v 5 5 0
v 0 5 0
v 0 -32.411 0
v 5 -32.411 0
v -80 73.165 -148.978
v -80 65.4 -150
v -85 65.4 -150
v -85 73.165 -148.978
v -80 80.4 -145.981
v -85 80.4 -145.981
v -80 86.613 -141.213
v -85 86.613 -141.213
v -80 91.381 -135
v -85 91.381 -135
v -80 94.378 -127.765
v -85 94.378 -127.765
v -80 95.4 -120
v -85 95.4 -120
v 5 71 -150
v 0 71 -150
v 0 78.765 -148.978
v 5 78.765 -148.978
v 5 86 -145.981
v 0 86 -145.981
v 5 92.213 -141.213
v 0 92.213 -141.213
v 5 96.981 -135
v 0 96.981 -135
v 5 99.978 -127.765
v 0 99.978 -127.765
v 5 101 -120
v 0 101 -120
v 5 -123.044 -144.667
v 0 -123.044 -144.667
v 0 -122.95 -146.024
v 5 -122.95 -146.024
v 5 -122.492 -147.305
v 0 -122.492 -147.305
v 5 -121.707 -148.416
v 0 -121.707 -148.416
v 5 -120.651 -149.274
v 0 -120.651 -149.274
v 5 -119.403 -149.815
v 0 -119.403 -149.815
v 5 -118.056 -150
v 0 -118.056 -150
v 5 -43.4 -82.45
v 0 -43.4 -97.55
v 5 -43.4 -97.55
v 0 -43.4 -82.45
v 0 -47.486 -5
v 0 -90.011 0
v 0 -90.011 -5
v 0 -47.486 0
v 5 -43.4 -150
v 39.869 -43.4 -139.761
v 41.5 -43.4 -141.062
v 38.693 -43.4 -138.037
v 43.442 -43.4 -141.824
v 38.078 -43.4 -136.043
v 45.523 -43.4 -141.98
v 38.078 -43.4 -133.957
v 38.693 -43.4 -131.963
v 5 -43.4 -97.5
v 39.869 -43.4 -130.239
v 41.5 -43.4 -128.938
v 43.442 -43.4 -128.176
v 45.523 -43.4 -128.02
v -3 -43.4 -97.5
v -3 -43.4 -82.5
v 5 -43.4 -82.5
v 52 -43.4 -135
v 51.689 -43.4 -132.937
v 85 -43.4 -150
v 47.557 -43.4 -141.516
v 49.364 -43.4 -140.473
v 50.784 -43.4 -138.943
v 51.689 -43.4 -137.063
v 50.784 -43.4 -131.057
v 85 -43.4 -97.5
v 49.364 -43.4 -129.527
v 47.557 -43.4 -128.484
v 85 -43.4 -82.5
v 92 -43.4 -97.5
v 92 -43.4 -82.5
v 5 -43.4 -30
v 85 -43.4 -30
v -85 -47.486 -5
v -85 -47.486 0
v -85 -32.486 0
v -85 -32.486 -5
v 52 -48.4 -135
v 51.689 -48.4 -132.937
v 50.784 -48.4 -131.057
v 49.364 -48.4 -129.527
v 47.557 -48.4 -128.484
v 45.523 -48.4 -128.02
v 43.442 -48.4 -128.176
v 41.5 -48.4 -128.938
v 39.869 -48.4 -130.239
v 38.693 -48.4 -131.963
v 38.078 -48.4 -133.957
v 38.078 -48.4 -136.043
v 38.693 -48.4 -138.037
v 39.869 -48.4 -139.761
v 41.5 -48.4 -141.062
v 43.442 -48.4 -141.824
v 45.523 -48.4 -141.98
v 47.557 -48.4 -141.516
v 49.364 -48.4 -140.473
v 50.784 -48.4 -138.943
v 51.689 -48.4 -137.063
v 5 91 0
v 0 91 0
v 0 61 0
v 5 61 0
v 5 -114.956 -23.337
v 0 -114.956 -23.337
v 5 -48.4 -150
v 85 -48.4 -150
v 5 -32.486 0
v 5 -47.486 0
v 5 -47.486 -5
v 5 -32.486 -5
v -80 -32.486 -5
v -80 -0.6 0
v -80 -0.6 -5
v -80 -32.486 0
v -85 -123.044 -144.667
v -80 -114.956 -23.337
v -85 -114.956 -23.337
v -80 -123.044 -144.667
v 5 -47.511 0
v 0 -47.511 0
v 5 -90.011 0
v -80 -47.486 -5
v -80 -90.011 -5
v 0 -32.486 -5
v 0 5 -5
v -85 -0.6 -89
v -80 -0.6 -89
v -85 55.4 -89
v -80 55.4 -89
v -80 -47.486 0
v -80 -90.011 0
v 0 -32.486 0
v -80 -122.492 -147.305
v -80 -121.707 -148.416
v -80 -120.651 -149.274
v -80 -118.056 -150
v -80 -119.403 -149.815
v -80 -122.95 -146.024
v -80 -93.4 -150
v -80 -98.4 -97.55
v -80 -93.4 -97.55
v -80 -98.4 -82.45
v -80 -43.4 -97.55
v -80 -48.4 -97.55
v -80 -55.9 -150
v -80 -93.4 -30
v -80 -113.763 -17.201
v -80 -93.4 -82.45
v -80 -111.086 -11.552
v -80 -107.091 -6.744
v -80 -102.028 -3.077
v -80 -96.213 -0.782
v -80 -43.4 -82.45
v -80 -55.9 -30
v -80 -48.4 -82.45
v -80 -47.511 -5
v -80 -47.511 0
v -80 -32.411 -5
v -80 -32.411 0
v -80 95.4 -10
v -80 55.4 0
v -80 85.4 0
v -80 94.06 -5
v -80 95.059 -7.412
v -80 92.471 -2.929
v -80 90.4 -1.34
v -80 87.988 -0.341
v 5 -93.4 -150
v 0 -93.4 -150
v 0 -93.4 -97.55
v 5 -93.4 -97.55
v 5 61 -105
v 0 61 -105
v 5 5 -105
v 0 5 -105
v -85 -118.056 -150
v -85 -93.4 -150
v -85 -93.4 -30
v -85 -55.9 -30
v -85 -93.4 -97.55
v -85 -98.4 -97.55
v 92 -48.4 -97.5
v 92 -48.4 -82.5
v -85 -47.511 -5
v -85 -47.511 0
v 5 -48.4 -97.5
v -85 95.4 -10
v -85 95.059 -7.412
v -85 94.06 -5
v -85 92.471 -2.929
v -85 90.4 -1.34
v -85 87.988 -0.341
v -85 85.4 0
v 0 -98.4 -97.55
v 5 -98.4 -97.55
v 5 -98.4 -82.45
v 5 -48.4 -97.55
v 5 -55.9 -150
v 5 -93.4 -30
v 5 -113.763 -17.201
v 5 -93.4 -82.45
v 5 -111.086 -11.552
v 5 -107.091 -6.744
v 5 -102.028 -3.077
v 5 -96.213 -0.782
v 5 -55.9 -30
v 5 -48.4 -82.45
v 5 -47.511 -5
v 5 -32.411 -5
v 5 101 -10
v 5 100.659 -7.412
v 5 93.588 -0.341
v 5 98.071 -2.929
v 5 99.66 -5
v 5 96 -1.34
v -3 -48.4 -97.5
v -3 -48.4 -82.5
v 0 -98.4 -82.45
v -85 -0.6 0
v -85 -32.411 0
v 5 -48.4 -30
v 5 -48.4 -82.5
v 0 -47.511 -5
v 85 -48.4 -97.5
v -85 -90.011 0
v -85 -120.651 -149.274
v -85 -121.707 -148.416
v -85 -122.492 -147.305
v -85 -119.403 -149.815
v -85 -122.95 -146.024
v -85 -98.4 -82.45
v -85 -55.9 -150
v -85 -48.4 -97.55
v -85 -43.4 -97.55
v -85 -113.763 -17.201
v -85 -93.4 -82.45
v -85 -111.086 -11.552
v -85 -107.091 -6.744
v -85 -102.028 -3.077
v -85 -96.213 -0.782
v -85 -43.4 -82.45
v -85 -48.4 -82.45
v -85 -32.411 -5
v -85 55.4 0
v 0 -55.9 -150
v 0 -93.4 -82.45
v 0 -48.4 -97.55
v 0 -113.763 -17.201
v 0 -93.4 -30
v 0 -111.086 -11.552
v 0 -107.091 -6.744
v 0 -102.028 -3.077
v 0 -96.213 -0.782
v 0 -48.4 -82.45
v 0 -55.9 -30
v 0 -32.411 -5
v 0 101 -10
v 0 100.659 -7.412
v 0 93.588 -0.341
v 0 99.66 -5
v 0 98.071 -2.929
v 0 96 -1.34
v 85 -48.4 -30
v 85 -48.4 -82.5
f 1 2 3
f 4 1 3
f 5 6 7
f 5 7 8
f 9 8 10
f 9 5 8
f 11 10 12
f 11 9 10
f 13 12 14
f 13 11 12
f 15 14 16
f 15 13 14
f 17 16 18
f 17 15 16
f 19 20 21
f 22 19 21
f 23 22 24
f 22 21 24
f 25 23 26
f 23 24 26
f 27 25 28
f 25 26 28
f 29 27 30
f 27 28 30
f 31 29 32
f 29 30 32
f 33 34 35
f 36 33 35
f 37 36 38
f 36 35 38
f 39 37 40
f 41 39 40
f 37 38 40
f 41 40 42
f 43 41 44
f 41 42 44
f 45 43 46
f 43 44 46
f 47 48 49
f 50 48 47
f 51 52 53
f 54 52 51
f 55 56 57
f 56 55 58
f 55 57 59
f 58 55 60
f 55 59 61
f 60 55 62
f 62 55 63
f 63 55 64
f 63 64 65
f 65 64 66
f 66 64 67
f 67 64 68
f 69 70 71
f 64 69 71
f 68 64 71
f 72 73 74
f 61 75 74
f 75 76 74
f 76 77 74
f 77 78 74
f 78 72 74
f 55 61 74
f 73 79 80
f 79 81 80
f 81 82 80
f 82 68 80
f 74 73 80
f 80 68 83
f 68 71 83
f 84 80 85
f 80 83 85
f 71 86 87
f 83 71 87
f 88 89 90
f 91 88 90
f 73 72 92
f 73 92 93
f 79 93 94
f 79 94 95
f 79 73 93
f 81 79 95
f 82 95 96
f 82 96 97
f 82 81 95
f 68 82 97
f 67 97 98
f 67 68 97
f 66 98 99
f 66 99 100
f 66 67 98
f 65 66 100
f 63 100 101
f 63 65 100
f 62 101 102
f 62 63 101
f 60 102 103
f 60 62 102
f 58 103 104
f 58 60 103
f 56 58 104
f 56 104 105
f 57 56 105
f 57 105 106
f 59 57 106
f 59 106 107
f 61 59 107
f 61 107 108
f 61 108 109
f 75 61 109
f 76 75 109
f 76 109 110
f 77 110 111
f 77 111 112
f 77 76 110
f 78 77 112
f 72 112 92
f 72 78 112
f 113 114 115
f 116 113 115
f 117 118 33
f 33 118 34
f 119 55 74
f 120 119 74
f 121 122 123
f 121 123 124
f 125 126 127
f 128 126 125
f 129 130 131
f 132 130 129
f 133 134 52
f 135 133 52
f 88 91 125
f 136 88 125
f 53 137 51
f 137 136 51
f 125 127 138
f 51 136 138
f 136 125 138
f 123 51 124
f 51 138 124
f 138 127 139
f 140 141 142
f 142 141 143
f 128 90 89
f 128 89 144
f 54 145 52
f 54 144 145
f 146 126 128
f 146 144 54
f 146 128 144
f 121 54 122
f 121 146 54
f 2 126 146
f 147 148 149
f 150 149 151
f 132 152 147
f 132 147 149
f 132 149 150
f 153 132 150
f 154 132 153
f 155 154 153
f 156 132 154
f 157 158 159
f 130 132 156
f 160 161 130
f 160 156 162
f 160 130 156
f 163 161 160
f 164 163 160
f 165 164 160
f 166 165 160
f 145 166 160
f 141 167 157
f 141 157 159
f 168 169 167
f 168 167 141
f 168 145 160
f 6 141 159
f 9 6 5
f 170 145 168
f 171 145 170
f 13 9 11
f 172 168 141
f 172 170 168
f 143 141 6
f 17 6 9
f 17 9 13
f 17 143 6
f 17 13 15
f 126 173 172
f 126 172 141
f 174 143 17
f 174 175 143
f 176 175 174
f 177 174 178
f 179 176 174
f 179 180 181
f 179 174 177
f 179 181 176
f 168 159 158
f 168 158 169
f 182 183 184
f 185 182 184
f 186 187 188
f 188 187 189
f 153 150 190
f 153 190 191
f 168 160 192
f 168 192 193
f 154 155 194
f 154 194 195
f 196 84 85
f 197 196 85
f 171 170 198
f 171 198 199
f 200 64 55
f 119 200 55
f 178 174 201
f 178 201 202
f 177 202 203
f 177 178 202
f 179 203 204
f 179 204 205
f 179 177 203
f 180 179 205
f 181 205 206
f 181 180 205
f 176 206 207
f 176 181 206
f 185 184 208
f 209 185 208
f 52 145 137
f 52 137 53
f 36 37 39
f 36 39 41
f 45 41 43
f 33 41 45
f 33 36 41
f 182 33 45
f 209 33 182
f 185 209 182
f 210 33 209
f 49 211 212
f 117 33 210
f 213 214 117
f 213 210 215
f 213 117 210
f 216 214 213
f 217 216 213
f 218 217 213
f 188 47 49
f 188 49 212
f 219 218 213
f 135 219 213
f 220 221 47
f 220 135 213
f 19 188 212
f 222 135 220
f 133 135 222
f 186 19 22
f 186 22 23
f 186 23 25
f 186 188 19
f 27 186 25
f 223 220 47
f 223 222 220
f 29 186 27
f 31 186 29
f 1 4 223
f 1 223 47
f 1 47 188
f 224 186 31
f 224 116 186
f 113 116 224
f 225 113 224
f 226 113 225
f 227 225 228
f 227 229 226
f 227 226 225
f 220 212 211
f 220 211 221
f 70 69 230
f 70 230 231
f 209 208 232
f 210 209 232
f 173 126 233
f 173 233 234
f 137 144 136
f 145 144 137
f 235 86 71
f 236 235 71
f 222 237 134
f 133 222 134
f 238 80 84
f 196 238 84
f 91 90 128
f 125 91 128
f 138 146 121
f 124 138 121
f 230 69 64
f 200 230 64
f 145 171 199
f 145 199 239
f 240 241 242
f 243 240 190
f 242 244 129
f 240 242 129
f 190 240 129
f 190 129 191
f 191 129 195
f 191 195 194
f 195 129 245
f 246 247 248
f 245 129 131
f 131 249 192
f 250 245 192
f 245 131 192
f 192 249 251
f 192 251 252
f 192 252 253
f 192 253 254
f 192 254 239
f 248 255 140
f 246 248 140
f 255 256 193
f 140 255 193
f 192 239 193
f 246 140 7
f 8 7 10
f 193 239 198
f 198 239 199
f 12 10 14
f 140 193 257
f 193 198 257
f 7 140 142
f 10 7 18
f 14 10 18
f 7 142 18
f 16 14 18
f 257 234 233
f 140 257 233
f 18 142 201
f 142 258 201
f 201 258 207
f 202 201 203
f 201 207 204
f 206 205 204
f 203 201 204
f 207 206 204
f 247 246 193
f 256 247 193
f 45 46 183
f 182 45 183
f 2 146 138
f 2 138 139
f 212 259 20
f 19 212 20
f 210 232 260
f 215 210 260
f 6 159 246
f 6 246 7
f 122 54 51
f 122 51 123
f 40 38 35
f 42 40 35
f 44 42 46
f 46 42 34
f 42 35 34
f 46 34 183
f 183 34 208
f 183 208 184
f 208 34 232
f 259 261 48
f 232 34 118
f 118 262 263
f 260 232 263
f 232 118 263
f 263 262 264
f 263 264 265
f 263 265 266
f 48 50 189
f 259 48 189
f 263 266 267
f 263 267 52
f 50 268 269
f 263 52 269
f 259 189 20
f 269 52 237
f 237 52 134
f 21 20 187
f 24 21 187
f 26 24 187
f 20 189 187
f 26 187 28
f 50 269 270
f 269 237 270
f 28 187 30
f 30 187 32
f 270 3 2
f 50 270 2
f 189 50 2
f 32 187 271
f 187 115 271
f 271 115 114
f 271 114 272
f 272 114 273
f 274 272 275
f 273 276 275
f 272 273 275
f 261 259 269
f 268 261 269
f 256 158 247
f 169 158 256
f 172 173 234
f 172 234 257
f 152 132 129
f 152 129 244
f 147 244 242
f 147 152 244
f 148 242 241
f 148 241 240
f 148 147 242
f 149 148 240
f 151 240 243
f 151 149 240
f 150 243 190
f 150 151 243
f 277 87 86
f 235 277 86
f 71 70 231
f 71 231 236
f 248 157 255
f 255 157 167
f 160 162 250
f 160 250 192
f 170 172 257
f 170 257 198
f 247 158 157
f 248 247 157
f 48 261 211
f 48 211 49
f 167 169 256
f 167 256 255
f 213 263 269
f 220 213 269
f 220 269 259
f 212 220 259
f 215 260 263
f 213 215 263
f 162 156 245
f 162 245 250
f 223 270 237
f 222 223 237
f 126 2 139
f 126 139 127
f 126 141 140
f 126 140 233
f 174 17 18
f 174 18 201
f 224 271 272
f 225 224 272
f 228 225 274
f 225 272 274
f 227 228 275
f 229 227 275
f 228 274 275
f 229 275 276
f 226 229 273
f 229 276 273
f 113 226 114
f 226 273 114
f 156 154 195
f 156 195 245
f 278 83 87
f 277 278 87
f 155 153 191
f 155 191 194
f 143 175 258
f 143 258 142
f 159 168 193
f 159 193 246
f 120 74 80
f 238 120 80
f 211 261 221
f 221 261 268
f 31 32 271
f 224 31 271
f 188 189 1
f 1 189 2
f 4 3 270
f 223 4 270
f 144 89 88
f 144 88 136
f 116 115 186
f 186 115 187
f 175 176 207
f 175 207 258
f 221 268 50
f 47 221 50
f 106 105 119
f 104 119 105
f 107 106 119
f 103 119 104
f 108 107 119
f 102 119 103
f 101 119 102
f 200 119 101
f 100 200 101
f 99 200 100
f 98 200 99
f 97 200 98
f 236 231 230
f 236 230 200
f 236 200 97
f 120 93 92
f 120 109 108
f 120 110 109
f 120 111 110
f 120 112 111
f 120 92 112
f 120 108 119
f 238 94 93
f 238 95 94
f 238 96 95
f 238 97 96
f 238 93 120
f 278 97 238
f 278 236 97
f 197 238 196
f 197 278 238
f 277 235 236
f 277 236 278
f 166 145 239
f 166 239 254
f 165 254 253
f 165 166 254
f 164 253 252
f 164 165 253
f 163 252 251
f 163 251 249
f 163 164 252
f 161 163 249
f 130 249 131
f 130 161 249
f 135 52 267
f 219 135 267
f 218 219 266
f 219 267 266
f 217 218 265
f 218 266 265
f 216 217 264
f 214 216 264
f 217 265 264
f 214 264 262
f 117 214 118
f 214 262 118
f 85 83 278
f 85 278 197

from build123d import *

# Parameters (mm, degrees)
F0_W     = 5
F0_H     = 15.1
F1_DEPTH = 5
F2_R     = 7
F2_W     = 8
F2_H     = 15
F2_W_2   = 7
F3_DEPTH = 5
F5_W     = 56
F5_H     = 16
F5_W_2   = 5
F5_H_2   = 15.1
F6_DEPTH = 5
F7_W     = 5
F7_H     = 15
F8_DEPTH = 5


with BuildPart() as f1:
    # F0 (on Right) → F1 (new body)
    with BuildSketch(Plane.YZ):
        with BuildLine():
            Line((5, -105), (5, 0))
            Line((5, 0), (0, 0))
            Line((0, 0), (-32.411173, 0))
            Line((-32.411173, 0), (-32.411173, -5))
            Line((-32.411173, -5), (-47.511173, -5))
            Line((-47.511173, -5), (-47.511173, 0))
            Line((-47.511173, 0), (-90.011173, 0))
            ThreePointArc((-90.011173, 0), (-107.090775, -6.743845), (-114.955802, -23.337025))
            Line((-114.955802, -23.337025), (-123.044494, -144.667405))
            ThreePointArc((-123.044494, -144.667405), (-121.706799, -148.41592), (-118.055568, -150))
            Line((-118.055568, -150), (-93.4, -150))
            Line((-93.4, -150), (-93.4, -97.55))
            Line((-93.4, -97.55), (-98.4, -97.55))
            Line((-98.4, -97.55), (-98.4, -82.45))
            Line((-98.4, -82.45), (-93.4, -82.45))
            Line((-93.4, -82.45), (-93.4, -30))
            Line((-93.4, -30), (-55.9, -30))
            Line((-55.9, -30), (-55.9, -150))
            Line((-55.9, -150), (-48.4, -150))
            Line((-48.4, -150), (71, -150))
            ThreePointArc((71, -150), (92.213203, -141.213203), (101, -120))
            Line((101, -120), (101, -10))
            ThreePointArc((101, -10), (98.071068, -2.928932), (91, 0))
            Line((91, 0), (61, 0))
            Line((61, 0), (61, -105))
            Line((61, -105), (5, -105))
        make_face()
        with Locations((-45.9, -90)):
            Rectangle(F0_W, F0_H, mode=Mode.SUBTRACT)
    extrude(amount=F1_DEPTH)


with BuildPart() as f3:
    # F2 (on face) → F3 (new body)
    with BuildSketch(Plane.XZ.offset(43.4)):
        Polygon((85, -30), (5, -30), (5, -82.5), (5, -97.5), (5, -150), (85, -150), (85, -97.5), (85, -82.5), align=None)
        with Locations((45, -135)):
            Circle(F2_R, mode=Mode.SUBTRACT)
        with Locations((1, -90)):
            Rectangle(F2_W, F2_H)
        with Locations((88.5, -90)):
            Rectangle(F2_W_2, F2_H)
    extrude(amount=F3_DEPTH)


with BuildPart() as f6:
    # F5 (on offset) → F6 (new body)
    with BuildSketch(Plane.YZ.offset(-80)):
        with Locations((27.4, -97)):
            Rectangle(F5_W, F5_H)
        with BuildLine():
            Line((-0.6, -89), (-0.6, 0))
            Line((-0.6, 0), (-5.6, 0))
            Line((-5.6, 0), (-32.411173, 0))
            Line((-32.411173, 0), (-32.411173, -5))
            Line((-32.411173, -5), (-47.511173, -5))
            Line((-47.511173, -5), (-47.511173, 0))
            Line((-47.511173, 0), (-90.011173, 0))
            ThreePointArc((-90.011173, 0), (-107.090775, -6.743845), (-114.955802, -23.337025))
            Line((-114.955802, -23.337025), (-123.044494, -144.667405))
            ThreePointArc((-123.044494, -144.667405), (-121.706799, -148.41592), (-118.055568, -150))
            Line((-118.055568, -150), (-93.4, -150))
            Line((-93.4, -150), (-93.4, -97.55))
            Line((-93.4, -97.55), (-98.4, -97.55))
            Line((-98.4, -97.55), (-98.4, -82.45))
            Line((-98.4, -82.45), (-93.4, -82.45))
            Line((-93.4, -82.45), (-93.4, -30))
            Line((-93.4, -30), (-55.9, -30))
            Line((-55.9, -30), (-55.9, -150))
            Line((-55.9, -150), (-48.4, -150))
            Line((-48.4, -150), (65.4, -150))
            ThreePointArc((65.4, -150), (86.613203, -141.213203), (95.4, -120))
            Line((95.4, -120), (95.4, -10))
            ThreePointArc((95.4, -10), (92.471068, -2.928932), (85.4, 0))
            Line((85.4, 0), (55.4, 0))
            Line((55.4, 0), (55.4, -89))
            Line((55.4, -89), (55.4, -105))
            Line((55.4, -105), (-0.6, -105))
            Line((-0.6, -105), (-0.6, -89))
        make_face()
        with Locations((-45.9, -90)):
            Rectangle(F5_W_2, F5_H_2, mode=Mode.SUBTRACT)
    extrude(amount=-F6_DEPTH)


with BuildPart() as f8:
    # F7 (on Top) → F8 (new body)
    with BuildSketch(Plane.XY):
        Polygon((-80, -90.011173), (0, -90.011173), (0, -47.486173), (0, -32.486173), (0, 5), (-80, -0.6), (-80, -32.486173), (-80, -47.486173), align=None)
        with Locations((2.5, -39.986173)):
            Rectangle(F7_W, F7_H)
        with Locations((-82.5, -39.986173)):
            Rectangle(F7_W, F7_H)
    extrude(amount=-F8_DEPTH)


solid = Compound([f1.part, f3.part, f6.part, f8.part])
